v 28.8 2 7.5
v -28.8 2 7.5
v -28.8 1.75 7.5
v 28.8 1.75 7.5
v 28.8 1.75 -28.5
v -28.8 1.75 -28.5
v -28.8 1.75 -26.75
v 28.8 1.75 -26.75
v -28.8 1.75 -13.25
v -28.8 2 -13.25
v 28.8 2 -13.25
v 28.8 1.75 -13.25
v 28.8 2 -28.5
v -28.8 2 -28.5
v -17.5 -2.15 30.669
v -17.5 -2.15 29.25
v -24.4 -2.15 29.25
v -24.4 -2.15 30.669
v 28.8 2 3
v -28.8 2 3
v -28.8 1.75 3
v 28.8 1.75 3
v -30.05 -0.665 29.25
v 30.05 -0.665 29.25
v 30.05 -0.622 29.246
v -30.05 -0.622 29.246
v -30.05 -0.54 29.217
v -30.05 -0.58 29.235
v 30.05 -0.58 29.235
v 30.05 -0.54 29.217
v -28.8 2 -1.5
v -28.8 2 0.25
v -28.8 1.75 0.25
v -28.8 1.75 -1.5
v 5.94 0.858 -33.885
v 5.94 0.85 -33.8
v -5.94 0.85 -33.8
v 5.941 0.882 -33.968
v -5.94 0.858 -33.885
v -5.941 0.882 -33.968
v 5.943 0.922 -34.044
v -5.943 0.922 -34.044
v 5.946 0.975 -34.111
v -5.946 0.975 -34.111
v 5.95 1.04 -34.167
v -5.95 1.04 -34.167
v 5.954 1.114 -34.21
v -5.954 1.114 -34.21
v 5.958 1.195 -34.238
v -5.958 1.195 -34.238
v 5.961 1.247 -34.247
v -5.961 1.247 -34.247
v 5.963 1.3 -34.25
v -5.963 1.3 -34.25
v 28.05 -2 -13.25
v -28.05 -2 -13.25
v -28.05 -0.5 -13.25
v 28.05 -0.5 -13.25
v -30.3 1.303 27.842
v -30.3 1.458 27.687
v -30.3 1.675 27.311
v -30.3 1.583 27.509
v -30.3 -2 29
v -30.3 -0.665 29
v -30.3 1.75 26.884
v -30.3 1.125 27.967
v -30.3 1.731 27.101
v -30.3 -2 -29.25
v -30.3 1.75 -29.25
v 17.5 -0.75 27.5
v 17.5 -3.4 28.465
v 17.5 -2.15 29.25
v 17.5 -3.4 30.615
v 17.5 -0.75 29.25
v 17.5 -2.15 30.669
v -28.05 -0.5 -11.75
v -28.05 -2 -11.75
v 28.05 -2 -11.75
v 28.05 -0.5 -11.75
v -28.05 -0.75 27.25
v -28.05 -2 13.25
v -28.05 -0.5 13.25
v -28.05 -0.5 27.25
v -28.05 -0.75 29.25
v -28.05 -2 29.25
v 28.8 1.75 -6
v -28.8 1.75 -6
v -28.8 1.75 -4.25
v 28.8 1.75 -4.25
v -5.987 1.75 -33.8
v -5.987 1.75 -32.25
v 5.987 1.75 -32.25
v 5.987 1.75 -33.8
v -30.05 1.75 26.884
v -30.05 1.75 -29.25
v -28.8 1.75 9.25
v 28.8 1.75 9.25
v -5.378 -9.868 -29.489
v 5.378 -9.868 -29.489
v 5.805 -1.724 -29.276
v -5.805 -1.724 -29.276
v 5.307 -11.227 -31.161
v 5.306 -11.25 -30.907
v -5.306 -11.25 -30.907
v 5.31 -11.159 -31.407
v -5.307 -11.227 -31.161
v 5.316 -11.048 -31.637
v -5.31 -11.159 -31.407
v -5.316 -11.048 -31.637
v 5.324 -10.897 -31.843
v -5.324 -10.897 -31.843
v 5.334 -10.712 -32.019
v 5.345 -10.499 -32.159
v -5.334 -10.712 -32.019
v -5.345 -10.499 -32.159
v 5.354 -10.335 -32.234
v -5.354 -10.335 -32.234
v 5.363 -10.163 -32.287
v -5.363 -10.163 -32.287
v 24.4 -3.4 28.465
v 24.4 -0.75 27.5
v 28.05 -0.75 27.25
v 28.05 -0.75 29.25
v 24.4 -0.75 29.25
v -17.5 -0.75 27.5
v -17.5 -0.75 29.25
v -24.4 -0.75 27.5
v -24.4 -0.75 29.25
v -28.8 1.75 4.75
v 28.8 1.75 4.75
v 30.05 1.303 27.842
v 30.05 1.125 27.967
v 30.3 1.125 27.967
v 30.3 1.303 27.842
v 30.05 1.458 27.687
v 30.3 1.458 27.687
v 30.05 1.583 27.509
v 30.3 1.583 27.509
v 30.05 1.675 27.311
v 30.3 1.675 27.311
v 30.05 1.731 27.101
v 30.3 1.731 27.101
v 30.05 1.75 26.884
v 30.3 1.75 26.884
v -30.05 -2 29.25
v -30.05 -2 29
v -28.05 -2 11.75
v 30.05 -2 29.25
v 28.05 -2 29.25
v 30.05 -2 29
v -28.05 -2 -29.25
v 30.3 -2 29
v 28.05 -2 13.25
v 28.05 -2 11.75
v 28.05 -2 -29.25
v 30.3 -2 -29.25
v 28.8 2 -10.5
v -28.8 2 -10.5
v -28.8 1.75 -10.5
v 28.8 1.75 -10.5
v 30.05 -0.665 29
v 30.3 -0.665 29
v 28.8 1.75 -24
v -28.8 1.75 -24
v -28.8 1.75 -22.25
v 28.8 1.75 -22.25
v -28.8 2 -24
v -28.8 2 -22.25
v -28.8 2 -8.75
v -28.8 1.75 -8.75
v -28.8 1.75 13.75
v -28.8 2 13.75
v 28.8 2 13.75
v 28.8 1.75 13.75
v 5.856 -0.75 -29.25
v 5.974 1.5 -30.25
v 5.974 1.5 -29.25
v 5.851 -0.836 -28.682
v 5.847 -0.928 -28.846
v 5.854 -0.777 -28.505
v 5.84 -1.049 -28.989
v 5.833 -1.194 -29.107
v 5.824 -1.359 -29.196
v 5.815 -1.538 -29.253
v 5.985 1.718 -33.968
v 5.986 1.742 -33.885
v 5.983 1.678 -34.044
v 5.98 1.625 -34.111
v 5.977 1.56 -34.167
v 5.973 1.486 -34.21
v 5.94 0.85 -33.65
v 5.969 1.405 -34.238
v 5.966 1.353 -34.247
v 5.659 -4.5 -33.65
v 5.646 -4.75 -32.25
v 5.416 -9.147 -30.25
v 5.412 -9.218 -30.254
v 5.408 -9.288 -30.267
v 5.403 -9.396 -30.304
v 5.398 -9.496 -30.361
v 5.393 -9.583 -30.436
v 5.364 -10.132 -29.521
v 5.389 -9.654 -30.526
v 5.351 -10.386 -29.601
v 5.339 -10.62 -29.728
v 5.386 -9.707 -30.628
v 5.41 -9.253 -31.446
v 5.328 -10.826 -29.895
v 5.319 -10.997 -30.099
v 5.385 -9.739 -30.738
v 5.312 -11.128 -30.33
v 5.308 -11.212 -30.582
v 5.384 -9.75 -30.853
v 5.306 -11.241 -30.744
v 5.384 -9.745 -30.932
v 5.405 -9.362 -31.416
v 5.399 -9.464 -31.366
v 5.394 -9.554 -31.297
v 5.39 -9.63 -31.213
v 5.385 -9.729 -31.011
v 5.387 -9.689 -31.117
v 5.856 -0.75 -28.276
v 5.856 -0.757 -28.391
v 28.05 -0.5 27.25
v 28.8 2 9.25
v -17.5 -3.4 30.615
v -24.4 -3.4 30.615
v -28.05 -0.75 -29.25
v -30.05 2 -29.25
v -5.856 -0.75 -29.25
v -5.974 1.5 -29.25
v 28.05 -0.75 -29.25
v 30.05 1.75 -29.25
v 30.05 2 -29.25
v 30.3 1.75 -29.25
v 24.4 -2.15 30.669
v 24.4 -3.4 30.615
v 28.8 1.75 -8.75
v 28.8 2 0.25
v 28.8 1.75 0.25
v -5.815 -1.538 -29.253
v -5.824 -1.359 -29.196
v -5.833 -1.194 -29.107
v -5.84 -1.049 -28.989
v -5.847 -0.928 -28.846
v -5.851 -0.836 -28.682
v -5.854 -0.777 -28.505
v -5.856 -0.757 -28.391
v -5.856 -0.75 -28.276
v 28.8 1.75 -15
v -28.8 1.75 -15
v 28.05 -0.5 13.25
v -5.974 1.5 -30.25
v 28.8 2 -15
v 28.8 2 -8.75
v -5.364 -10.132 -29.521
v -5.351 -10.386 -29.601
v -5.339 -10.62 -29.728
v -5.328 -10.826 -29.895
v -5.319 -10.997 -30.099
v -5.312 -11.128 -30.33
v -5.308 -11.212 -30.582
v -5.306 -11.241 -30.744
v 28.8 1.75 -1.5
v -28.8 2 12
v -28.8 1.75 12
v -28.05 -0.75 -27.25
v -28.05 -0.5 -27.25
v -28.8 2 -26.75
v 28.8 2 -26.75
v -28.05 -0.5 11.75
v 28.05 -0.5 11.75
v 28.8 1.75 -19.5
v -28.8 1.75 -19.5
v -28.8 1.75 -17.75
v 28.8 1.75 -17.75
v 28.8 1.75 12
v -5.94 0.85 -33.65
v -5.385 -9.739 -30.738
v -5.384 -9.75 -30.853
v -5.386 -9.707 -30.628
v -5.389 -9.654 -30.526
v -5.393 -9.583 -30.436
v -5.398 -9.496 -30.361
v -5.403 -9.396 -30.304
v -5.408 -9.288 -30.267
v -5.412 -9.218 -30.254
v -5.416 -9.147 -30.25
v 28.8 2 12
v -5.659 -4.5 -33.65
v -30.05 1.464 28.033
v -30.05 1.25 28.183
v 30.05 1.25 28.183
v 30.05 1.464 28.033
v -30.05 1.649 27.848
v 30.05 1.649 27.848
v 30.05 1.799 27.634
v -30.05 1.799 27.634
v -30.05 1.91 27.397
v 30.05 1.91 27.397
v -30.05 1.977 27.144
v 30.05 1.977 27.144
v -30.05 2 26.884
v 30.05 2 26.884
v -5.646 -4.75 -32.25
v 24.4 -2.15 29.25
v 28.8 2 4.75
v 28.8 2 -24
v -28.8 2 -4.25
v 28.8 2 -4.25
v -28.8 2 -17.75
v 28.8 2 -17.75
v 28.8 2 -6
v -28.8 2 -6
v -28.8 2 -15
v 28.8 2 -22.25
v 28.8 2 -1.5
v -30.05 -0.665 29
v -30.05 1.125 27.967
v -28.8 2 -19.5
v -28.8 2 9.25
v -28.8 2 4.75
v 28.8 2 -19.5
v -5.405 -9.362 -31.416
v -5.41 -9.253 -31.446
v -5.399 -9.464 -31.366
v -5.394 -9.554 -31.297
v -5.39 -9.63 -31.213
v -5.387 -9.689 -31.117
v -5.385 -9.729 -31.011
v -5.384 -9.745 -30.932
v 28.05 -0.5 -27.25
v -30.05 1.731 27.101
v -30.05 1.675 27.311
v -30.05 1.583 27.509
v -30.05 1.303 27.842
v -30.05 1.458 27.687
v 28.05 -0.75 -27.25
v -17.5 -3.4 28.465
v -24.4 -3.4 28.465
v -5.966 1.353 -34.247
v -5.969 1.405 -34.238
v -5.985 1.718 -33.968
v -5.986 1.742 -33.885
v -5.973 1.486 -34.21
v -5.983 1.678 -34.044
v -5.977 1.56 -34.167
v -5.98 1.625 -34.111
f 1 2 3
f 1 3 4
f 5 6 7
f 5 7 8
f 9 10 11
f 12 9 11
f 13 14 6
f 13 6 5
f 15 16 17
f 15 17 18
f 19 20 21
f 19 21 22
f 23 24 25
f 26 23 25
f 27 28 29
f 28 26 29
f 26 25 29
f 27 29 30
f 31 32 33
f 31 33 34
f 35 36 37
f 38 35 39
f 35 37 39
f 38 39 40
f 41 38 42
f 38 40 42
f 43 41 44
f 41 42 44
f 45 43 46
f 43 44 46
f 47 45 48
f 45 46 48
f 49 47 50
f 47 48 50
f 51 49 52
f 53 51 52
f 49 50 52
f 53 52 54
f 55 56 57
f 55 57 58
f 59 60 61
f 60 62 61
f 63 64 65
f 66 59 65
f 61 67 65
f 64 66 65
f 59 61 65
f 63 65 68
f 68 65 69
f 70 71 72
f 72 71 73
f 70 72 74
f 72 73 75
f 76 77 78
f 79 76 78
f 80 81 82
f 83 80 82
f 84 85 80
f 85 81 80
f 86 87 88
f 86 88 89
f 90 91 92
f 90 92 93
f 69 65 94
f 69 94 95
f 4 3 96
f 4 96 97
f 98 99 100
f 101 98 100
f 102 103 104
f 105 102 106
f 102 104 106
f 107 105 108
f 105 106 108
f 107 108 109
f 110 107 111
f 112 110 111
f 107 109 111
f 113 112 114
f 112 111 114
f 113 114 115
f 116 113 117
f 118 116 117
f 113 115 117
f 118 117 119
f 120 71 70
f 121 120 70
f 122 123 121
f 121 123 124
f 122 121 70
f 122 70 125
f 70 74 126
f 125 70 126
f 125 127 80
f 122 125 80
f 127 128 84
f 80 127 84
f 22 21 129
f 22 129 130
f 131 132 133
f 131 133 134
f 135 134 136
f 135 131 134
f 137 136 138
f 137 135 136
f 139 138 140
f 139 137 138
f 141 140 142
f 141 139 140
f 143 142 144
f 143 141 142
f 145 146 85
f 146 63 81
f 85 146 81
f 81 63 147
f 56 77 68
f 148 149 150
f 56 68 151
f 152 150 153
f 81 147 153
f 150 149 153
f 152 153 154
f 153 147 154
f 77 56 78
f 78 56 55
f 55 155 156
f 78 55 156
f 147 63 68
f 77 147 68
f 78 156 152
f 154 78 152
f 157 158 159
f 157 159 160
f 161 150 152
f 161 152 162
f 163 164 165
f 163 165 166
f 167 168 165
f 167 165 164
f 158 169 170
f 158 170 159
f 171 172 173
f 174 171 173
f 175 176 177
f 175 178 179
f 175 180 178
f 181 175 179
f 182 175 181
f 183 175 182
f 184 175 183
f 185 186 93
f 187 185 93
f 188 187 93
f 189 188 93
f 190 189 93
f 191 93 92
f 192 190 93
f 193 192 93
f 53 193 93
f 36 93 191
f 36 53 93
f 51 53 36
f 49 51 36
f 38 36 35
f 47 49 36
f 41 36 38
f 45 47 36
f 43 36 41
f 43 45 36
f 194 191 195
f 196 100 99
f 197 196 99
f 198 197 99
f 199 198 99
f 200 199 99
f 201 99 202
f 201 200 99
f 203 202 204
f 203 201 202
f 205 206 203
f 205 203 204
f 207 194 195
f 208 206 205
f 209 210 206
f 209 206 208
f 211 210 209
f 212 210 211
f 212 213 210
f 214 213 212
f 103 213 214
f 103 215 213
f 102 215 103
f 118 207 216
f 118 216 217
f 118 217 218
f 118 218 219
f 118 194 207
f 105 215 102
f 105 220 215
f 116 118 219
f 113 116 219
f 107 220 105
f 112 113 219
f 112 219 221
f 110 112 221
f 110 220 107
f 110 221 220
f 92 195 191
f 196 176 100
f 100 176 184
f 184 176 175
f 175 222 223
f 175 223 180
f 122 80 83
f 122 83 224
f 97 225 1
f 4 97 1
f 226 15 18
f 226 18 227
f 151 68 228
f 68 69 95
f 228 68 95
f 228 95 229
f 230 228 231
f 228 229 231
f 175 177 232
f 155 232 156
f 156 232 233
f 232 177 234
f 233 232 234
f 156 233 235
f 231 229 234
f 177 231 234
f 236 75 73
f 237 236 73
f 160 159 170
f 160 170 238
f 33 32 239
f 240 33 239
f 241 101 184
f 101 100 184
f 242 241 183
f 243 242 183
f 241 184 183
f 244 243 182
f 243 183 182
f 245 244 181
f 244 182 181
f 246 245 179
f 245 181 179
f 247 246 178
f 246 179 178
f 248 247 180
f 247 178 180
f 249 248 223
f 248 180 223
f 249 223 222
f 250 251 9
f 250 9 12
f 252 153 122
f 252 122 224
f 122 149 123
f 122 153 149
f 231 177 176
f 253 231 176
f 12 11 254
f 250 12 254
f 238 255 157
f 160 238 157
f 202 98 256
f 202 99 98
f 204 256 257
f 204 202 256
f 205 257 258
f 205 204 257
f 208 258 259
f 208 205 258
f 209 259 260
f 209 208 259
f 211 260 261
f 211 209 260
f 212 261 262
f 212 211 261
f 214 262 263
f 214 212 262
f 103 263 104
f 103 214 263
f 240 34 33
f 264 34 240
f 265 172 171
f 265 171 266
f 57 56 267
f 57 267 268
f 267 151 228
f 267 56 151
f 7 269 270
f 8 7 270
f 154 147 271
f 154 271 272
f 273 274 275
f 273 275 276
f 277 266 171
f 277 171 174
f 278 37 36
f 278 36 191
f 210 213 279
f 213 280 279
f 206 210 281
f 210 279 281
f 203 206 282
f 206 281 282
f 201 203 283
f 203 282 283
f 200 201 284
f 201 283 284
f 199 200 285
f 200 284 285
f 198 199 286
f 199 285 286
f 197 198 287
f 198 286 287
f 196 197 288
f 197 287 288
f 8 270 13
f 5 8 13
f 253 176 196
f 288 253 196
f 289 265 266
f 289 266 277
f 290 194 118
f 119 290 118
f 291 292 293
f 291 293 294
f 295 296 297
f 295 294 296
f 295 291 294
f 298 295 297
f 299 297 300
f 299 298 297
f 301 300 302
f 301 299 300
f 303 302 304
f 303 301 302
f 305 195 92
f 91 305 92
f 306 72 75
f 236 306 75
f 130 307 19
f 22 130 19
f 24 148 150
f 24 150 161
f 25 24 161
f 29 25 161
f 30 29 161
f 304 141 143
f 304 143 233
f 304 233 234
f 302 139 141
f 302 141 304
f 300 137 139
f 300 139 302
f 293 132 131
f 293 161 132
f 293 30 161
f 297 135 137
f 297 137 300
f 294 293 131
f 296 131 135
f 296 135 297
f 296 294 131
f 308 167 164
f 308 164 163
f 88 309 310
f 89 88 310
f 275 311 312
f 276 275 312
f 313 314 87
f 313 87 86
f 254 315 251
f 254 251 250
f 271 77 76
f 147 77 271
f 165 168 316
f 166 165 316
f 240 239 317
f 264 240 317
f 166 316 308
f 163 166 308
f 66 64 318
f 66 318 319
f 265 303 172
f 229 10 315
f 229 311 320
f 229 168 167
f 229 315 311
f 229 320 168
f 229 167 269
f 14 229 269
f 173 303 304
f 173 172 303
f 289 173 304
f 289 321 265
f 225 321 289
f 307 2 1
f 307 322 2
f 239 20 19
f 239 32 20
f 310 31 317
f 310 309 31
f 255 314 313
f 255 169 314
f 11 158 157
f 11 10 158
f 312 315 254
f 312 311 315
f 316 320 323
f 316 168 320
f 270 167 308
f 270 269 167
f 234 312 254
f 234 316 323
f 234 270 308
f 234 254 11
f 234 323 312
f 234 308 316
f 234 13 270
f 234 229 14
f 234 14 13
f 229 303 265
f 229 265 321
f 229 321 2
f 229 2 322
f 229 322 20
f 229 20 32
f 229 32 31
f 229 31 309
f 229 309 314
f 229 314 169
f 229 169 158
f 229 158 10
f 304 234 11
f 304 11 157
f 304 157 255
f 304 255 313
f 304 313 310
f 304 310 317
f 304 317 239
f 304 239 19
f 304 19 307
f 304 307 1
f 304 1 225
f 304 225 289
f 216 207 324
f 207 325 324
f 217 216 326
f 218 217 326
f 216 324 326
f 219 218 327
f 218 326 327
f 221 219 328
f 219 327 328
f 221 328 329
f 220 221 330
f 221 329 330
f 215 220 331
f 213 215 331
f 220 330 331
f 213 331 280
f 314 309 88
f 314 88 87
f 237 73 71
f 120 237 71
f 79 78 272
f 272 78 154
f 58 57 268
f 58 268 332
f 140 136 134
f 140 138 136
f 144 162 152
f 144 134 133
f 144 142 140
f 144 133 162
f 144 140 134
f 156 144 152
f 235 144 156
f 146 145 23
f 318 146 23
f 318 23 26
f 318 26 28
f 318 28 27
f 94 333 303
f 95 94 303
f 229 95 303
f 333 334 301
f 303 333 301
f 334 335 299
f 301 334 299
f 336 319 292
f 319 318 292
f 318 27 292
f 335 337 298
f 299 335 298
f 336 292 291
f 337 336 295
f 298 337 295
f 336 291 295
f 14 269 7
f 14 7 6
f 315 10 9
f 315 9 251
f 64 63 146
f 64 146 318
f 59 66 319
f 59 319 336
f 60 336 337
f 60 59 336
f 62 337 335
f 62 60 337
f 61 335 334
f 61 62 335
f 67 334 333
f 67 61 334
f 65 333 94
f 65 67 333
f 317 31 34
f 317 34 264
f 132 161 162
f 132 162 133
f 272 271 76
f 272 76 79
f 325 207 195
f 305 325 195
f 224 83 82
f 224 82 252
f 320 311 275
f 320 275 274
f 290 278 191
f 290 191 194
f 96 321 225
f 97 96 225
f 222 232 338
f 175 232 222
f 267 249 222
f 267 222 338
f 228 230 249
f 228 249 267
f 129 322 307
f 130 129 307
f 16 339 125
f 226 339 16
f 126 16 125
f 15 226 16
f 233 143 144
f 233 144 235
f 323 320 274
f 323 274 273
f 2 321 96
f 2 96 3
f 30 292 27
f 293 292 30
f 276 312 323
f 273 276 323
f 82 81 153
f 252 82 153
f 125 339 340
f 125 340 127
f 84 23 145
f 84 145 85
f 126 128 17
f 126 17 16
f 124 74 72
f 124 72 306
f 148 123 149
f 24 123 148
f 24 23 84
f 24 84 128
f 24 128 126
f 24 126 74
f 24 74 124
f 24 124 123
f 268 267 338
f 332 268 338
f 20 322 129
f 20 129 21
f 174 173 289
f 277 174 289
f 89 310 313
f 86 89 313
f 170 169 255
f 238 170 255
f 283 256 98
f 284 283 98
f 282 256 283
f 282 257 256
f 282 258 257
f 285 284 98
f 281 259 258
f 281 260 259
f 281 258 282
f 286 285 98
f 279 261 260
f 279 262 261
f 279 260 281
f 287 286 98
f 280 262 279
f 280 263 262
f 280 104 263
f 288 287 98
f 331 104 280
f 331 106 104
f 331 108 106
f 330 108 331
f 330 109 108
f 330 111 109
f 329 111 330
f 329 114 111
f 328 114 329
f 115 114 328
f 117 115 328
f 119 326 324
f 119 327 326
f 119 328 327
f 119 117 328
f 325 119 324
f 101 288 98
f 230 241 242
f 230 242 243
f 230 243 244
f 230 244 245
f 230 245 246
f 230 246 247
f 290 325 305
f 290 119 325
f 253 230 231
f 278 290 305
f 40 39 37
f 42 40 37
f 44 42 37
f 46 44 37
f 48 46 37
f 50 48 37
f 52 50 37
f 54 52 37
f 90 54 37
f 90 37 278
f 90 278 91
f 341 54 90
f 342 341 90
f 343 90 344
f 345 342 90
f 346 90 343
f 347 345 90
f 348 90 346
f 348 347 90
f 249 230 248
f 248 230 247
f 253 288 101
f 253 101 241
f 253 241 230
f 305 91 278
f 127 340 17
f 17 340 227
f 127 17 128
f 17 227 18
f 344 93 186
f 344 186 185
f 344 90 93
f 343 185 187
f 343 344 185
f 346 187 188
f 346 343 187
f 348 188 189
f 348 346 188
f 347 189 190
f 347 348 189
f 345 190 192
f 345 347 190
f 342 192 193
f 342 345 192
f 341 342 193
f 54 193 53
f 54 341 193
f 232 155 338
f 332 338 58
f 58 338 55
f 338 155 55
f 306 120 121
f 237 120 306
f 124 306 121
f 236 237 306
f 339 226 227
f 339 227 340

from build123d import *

# Parameters (mm, degrees)
SKETCH1_W           = 60.6
SKETCH1_H           = 58.5
BOSS_EXTRUDE1_DEPTH = 2
SKETCH2_W           = 56.1
SKETCH2_H           = 23.5
SKETCH2_H_2         = 14
CUT_EXTRUDE1_DEPTH  = 1.5
CUT_EXTRUDE2_REACH  = 67.912
SKETCH3_W           = 56.1
SKETCH3_H           = 1.25
BOSS_EXTRUDE2_START = 17.5
BOSS_EXTRUDE2_DEPTH = 6.9
BOSS_EXTRUDE3_DEPTH = 6
DRAFT1_START        = -35
DRAFT1_DEPTH        = 5.75
FILLET1_R           = 0.45
FILLET2_R           = 0.602786
FILLET3_R           = 1.418858
FILLET4_R           = 1
SKETCH6_W           = 57.6
SKETCH6_H           = 1.75
CUT_EXTRUDE3_DEPTH  = 0.25
CHAMFER1_START      = 25.032204955
CHAMFER1_OUTLINE_W  = 60.6
CHAMFER1_OUTLINE_H  = 3
CHAMFER1_DEPTH      = 1.967795045
FILLET5_START       = -31
FILLET5_DEPTH       = 62
FILLET6_R           = 0.25
CUT_SWEEP1_START    = -31
CUT_SWEEP1_DEPTH    = 0.95
CUT_SWEEP1_START_2  = 30.05
CUT_SWEEP1_2_DEPTH  = 0.95


with BuildPart() as part:
    # Sketch1 → Boss-Extrude1 (new, symmetric)
    with BuildSketch(Plane(origin=(0, 0, 0), x_dir=(1, 0, 0), z_dir=(0, 1, 0))):
        Rectangle(SKETCH1_W, SKETCH1_H)
    extrude(amount=BOSS_EXTRUDE1_DEPTH, both=True)

    # Sketch2 → Cut-Extrude1 (cut)
    with BuildSketch(Plane.XZ.offset(2)):
        Rectangle(SKETCH2_W, SKETCH2_H)
        with Locations((0, 20.25)):
            Rectangle(SKETCH2_W, SKETCH2_H_2)
        with Locations((0, -20.25)):
            Rectangle(SKETCH2_W, SKETCH2_H_2)
    extrude(amount=-CUT_EXTRUDE1_DEPTH, mode=Mode.SUBTRACT)

    # Sketch3 → Cut-Extrude2 (cut, up to next)
    with BuildSketch(Plane(origin=(0, 0, -29.25), x_dir=(-1, 0, 0), z_dir=(0, 0, -1)), mode=Mode.PRIVATE) as cut_extrude2_sk1:
        with Locations((0, -1.375)):
            Rectangle(SKETCH3_W, SKETCH3_H)
    cut_extrude2_tool1 = extrude(cut_extrude2_sk1.sketch, amount=-CUT_EXTRUDE2_REACH, mode=Mode.PRIVATE) & part.part
    cut_extrude2 = cut_extrude2_tool1.solids().sort_by_distance((0, -1.375, -29.25))[0]
    add(cut_extrude2, mode=Mode.SUBTRACT)

    # Mirror1: Cut-Extrude2 across plane
    add(cut_extrude2.mirror(Plane.XY), mode=Mode.SUBTRACT)

    # Boss-Extrude2: read off the stored shape, not the designer's step
    # Boss-Extrude2 outline → Boss-Extrude2 (add)
    with BuildSketch(Plane.YZ.offset(BOSS_EXTRUDE2_START)):
        Polygon((-0.75, 29.25), (-2.15, 29.25), (-2.15, 30.669097299), (-3.4, 30.614521121), (-3.4, 28.464521121), (-0.75, 27.5), align=None)
    boss_extrude2 = extrude(amount=BOSS_EXTRUDE2_DEPTH)

    # Sketch5 → Boss-Extrude3 (add, symmetric)
    with BuildSketch(Plane(origin=(0, 0, 0), x_dir=(0, 0, -1), z_dir=(1, 0, 0))):
        Polygon((29.25, 1.5), (30.25, 1.5), (30.25, -9.75), (31.357502325, -9.75), (32.25, -4.75), (32.25, 1.75), (34.25, 1.75), (34.25, 0.85), (33.65, 0.85), (33.65, -4.5), (32.024952176, -11.25), (29.524952176, -11.25), (29.25, -0.75), align=None)
    extrude(amount=BOSS_EXTRUDE3_DEPTH, both=True)

    # Draft1: read off the stored shape, not the designer's step
    # Draft1 outline → Draft1 (cut)
    with BuildSketch(Plane.XY.offset(DRAFT1_START)):
        Polygon((5.305596924, -11.25), (6, -11.25), (6, 1.75), (5.986898055, 1.75), align=None)
        Polygon((-6, -11.25), (-5.305596924, -11.25), (-5.986898055, 1.75), (-6, 1.75), align=None)
    extrude(amount=DRAFT1_DEPTH, mode=Mode.SUBTRACT)

    # Fillet1
    fillet1_edges = [part.edges().sort_by_distance(p)[0] for p in [
        (0, 0.85, -34.25),
        (0, 1.75, -34.25),
    ]]
    fillet(fillet1_edges, radius=FILLET1_R - 0.0001)  # a hair under: the kernel refuses the full size

    # Fillet2
    fillet2_edges = [part.edges().sort_by_distance(p)[0] for p in [
        (0, -9.75, -31.357502325),
        (0, -9.75, -30.25),
    ]]
    fillet(fillet2_edges, radius=FILLET2_R - 0.0001)  # a hair under: the kernel refuses the full size

    # Fillet3
    fillet3_edges = [part.edges().sort_by_distance(p)[0] for p in [
        (0, -11.25, -29.524952176),
        (0, -11.25, -32.024952176),
    ]]
    fillet(fillet3_edges, radius=FILLET3_R - 0.0001)  # a hair under: the kernel refuses the full size

    # Fillet4
    fillet4_edges = [part.edges().sort_by_distance(p)[0] for p in [
        (0, -0.75, -29.25),
    ]]
    fillet(fillet4_edges, radius=FILLET4_R)

    # Sketch6 → Cut-Extrude3 (cut)
    with BuildSketch(Plane(origin=(0, 2, 0), x_dir=(1, 0, 0), z_dir=(0, 1, 0))):
        with Locations((0, 27.625)):
            Rectangle(SKETCH6_W, SKETCH6_H)
        with Locations((0, 23.125)):
            Rectangle(SKETCH6_W, SKETCH6_H)
        with Locations((0, 18.625)):
            Rectangle(SKETCH6_W, SKETCH6_H)
        with Locations((0, 14.125)):
            Rectangle(SKETCH6_W, SKETCH6_H)
        with Locations((0, 9.625)):
            Rectangle(SKETCH6_W, SKETCH6_H)
        with Locations((0, 5.125)):
            Rectangle(SKETCH6_W, SKETCH6_H)
        with Locations((0, 0.625)):
            Rectangle(SKETCH6_W, SKETCH6_H)
        with Locations((0, -3.875)):
            Rectangle(SKETCH6_W, SKETCH6_H)
        with Locations((0, -8.375)):
            Rectangle(SKETCH6_W, SKETCH6_H)
        with Locations((0, -12.875)):
            Rectangle(SKETCH6_W, SKETCH6_H)
    extrude(amount=-CUT_EXTRUDE3_DEPTH, mode=Mode.SUBTRACT)

    # Chamfer1: read off the stored shape, not the designer's step
    # Chamfer1 outline → Chamfer1 (cut)
    with BuildSketch(Plane(origin=(0, 0, 0), x_dir=(1, 0, 0), z_dir=(0, 0.500000000000001, 0.866025403784438)).offset(CHAMFER1_START)):
        with Locations((0, -13.642949192)):
            Rectangle(CHAMFER1_OUTLINE_W, CHAMFER1_OUTLINE_H)
    extrude(amount=CHAMFER1_DEPTH, mode=Mode.SUBTRACT)

    # Fillet5: read off the stored shape, not the designer's step
    # Fillet5 outline → Fillet5 (cut)
    with BuildSketch(Plane.YZ.offset(FILLET5_START)):
        with BuildLine():
            ThreePointArc((1.25, 28.183012702), (1.799038106, 27.633974596), (2, 26.883974596))
            Line((2, 26.883974596), (2, 27.75))
            Line((2, 27.75), (1.25, 28.183012702))
        make_face()
    extrude(amount=FILLET5_DEPTH, mode=Mode.SUBTRACT)

    # Fillet6
    fillet6_edges = [part.edges().sort_by_distance(p)[0] for p in [
        (0, -0.598076211, 29.25),
    ]]
    fillet(fillet6_edges, radius=FILLET6_R)

    # Cut-Sweep1: read off the stored shape, not the designer's step
    # Cut-Sweep1 outline → Cut-Sweep1 (cut)
    with BuildSketch(Plane.YZ.offset(CUT_SWEEP1_START)):
        with BuildLine():
            ThreePointArc((1.125, 27.966506351), (1.582531755, 27.508974596), (1.75, 26.883974596))
            Line((1.75, 26.883974596), (1.75, -29.25))
            Line((1.75, -29.25), (2, -29.25))
            Line((2, -29.25), (2, 26.883974596))
            ThreePointArc((2, 26.883974596), (1.799038106, 27.633974596), (1.25, 28.183012702))
            Line((1.25, 28.183012702), (-0.540063509, 29.216506351))
            ThreePointArc((-0.540063509, 29.216506351), (-0.600358748, 29.241481457), (-0.665063509, 29.25))
            Line((-0.665063509, 29.25), (-2, 29.25))
            Line((-2, 29.25), (-2, 29))
            Line((-2, 29), (-0.665063509, 29))
            Line((-0.665063509, 29), (1.125, 27.966506351))
        make_face()
    extrude(amount=CUT_SWEEP1_DEPTH, mode=Mode.SUBTRACT)

    # Cut-Sweep1 2 outline → Cut-Sweep1 2 (cut)
    with BuildSketch(Plane.YZ.offset(CUT_SWEEP1_START_2)):
        with BuildLine():
            ThreePointArc((1.125, 27.966506351), (1.582531755, 27.508974596), (1.75, 26.883974596))
            Line((1.75, 26.883974596), (1.75, -29.25))
            Line((1.75, -29.25), (2, -29.25))
            Line((2, -29.25), (2, 26.883974596))
            ThreePointArc((2, 26.883974596), (1.799038106, 27.633974596), (1.25, 28.183012702))
            Line((1.25, 28.183012702), (-0.540063509, 29.216506351))
            ThreePointArc((-0.540063509, 29.216506351), (-0.600358748, 29.241481457), (-0.665063509, 29.25))
            Line((-0.665063509, 29.25), (-2, 29.25))
            Line((-2, 29.25), (-2, 29))
            Line((-2, 29), (-0.665063509, 29))
            Line((-0.665063509, 29), (1.125, 27.966506351))
        make_face()
    extrude(amount=CUT_SWEEP1_2_DEPTH, mode=Mode.SUBTRACT)

    # Mirror2: Boss-Extrude2 across plane
    add(boss_extrude2.mirror(Plane(origin=(0, 0, 0), x_dir=(0, 0, 1), z_dir=(1, 0, 0))))


solid = part.part
